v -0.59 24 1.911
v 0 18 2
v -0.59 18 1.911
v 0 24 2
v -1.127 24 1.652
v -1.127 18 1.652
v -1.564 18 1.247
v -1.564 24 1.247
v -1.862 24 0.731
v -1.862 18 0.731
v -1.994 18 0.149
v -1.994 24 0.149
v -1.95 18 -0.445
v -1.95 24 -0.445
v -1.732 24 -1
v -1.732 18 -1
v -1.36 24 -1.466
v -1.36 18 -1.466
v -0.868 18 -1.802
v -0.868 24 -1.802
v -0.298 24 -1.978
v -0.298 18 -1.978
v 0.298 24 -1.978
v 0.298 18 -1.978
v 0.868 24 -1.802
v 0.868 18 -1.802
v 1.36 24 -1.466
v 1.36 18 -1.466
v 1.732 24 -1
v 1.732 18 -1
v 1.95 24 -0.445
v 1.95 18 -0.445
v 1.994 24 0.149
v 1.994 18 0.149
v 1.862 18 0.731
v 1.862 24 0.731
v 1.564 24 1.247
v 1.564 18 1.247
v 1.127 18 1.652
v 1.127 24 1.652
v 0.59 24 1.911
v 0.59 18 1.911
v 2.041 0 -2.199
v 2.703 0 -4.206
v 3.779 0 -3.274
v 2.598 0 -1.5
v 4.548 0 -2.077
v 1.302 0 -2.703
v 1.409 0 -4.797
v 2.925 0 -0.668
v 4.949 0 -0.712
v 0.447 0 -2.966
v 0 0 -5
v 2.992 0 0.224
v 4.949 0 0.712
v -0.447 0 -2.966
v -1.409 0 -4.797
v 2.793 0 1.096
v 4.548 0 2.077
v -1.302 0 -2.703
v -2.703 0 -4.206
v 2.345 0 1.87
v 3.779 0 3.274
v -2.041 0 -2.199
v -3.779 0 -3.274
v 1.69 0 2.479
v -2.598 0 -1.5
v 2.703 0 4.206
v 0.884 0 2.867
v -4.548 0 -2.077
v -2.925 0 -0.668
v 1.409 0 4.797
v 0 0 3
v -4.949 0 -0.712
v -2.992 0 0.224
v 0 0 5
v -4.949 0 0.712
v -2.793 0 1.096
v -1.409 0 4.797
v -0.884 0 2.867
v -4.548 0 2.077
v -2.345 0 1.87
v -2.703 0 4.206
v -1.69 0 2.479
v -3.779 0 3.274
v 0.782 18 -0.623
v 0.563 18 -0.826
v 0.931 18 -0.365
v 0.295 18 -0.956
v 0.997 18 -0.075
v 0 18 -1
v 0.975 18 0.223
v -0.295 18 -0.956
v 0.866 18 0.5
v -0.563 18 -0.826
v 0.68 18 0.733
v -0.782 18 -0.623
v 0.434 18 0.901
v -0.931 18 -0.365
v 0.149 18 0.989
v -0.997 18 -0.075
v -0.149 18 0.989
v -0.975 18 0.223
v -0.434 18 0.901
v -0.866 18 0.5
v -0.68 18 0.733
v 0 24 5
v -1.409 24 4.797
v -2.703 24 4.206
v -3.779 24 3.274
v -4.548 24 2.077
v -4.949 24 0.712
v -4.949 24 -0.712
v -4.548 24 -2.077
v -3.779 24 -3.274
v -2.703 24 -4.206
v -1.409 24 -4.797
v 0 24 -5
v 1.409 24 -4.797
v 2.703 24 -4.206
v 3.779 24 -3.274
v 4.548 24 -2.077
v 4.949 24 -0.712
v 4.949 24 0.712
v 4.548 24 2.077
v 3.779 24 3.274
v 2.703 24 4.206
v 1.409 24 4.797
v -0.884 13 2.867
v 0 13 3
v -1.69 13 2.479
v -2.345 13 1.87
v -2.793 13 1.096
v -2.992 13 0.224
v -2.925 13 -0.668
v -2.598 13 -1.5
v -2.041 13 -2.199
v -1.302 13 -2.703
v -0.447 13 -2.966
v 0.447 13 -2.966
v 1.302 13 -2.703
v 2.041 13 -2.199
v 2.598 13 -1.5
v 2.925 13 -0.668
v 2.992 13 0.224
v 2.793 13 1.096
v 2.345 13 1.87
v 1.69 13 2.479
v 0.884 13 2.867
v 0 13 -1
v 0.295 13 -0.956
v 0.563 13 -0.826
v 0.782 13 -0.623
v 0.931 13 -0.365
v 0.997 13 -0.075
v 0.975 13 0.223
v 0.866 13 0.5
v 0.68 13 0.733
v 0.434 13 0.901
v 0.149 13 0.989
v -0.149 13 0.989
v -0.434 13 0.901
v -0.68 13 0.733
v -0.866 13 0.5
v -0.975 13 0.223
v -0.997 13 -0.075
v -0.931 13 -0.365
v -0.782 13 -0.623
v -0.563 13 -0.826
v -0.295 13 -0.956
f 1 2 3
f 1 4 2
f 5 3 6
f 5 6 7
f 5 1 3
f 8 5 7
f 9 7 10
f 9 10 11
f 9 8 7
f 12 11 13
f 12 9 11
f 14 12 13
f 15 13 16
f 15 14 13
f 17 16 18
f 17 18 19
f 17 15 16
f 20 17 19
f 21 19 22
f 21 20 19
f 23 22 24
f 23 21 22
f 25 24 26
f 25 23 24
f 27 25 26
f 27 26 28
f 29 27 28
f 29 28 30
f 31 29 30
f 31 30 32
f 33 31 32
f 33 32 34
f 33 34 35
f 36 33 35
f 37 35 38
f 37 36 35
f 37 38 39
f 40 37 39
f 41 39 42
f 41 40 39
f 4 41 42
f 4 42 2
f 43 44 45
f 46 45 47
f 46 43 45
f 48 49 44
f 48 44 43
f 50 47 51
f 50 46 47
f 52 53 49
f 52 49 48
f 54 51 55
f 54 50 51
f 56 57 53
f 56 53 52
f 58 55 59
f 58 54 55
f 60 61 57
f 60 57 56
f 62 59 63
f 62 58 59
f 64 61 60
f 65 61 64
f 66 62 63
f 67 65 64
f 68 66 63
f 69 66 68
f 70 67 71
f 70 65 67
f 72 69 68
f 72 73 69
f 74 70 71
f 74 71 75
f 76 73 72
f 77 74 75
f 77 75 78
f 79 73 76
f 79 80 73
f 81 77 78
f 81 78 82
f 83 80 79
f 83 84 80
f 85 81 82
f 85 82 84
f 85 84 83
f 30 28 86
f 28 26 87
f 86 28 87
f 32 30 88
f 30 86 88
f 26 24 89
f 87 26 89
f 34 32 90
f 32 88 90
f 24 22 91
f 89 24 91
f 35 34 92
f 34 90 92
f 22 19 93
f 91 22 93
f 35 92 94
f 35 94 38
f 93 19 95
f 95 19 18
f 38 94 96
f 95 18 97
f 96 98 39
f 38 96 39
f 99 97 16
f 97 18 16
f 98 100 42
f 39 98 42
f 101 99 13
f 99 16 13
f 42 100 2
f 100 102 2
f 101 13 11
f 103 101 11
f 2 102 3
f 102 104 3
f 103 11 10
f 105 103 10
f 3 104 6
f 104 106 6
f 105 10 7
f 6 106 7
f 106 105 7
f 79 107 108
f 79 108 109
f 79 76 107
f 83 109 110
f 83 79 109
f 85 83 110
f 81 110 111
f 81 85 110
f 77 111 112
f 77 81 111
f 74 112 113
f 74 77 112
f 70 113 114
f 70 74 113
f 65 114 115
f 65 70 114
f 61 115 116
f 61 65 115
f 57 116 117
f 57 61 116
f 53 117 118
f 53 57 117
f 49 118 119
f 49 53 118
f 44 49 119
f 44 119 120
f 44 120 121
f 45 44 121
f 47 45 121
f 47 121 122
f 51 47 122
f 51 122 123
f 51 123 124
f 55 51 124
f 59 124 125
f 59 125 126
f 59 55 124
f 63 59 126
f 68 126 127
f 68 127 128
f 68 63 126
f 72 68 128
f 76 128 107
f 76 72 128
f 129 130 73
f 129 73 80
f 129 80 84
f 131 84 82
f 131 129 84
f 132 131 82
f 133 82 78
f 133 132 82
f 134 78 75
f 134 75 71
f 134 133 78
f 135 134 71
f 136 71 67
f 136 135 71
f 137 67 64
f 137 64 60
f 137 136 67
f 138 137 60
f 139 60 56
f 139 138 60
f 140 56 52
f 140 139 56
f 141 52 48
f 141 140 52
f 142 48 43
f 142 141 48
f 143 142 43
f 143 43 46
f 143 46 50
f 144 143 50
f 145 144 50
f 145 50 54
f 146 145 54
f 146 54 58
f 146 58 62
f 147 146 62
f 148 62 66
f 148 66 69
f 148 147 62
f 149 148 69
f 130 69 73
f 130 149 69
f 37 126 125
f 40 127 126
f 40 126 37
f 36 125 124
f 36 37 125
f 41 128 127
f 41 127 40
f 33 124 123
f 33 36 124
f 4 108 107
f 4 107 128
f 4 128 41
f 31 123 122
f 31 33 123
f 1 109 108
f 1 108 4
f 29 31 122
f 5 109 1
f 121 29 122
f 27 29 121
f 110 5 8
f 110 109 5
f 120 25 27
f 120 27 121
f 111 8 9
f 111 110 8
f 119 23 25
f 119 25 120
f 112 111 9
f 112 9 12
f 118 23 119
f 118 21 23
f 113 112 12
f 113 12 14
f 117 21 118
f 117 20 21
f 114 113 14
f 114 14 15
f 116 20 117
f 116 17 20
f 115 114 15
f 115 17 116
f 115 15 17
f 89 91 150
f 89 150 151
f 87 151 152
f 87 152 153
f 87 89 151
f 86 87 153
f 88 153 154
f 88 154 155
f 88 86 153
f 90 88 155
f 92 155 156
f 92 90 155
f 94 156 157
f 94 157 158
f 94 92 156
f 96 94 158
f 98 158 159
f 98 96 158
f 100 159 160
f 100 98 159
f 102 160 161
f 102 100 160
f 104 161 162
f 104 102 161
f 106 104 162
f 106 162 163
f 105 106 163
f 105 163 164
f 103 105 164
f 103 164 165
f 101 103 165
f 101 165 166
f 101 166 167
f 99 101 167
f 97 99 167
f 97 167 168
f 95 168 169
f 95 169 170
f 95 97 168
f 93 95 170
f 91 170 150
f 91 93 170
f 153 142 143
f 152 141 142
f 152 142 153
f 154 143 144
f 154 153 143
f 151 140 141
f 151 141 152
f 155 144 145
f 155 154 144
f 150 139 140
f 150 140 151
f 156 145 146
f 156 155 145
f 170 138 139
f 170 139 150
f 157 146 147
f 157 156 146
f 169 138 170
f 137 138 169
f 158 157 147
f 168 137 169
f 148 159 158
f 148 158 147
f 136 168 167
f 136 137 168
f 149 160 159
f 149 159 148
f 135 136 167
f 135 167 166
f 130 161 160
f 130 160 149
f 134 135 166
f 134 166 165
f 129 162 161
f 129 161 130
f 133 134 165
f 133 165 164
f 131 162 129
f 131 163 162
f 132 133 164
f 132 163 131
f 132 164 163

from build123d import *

# Parameters (mm, degrees)
SKETCH3_R           = 3
SKETCH3_R_2         = 1
BOSS_EXTRUDE1_DEPTH = 5


with BuildPart() as part:
    # Sketch2 → Revolve1 (revolve)
    with BuildSketch(Plane.XY, mode=Mode.PRIVATE) as revolve1_sk:
        Polygon((3, 0), (3, 18), (2, 18), (2, 24), (5, 24), (5, 0), align=None)
    revolve(revolve1_sk.sketch.rotate(Axis((0, 10.839741494, 0), (0, -1, 0)), 90), axis=Axis((0, 10.839741494, 0), (0, -1, 0)))

    # Sketch3 → Boss-Extrude1 (add)
    with BuildSketch(Plane.XZ.offset(-18)):
        with Locations(Location((0, 0, 0), (0, 0, 90))):
            Circle(SKETCH3_R)
        with Locations(Location((0, 0, 0), (0, 0, 270))):
            Circle(SKETCH3_R_2, mode=Mode.SUBTRACT)
    extrude(amount=BOSS_EXTRUDE1_DEPTH)


solid = part.part
